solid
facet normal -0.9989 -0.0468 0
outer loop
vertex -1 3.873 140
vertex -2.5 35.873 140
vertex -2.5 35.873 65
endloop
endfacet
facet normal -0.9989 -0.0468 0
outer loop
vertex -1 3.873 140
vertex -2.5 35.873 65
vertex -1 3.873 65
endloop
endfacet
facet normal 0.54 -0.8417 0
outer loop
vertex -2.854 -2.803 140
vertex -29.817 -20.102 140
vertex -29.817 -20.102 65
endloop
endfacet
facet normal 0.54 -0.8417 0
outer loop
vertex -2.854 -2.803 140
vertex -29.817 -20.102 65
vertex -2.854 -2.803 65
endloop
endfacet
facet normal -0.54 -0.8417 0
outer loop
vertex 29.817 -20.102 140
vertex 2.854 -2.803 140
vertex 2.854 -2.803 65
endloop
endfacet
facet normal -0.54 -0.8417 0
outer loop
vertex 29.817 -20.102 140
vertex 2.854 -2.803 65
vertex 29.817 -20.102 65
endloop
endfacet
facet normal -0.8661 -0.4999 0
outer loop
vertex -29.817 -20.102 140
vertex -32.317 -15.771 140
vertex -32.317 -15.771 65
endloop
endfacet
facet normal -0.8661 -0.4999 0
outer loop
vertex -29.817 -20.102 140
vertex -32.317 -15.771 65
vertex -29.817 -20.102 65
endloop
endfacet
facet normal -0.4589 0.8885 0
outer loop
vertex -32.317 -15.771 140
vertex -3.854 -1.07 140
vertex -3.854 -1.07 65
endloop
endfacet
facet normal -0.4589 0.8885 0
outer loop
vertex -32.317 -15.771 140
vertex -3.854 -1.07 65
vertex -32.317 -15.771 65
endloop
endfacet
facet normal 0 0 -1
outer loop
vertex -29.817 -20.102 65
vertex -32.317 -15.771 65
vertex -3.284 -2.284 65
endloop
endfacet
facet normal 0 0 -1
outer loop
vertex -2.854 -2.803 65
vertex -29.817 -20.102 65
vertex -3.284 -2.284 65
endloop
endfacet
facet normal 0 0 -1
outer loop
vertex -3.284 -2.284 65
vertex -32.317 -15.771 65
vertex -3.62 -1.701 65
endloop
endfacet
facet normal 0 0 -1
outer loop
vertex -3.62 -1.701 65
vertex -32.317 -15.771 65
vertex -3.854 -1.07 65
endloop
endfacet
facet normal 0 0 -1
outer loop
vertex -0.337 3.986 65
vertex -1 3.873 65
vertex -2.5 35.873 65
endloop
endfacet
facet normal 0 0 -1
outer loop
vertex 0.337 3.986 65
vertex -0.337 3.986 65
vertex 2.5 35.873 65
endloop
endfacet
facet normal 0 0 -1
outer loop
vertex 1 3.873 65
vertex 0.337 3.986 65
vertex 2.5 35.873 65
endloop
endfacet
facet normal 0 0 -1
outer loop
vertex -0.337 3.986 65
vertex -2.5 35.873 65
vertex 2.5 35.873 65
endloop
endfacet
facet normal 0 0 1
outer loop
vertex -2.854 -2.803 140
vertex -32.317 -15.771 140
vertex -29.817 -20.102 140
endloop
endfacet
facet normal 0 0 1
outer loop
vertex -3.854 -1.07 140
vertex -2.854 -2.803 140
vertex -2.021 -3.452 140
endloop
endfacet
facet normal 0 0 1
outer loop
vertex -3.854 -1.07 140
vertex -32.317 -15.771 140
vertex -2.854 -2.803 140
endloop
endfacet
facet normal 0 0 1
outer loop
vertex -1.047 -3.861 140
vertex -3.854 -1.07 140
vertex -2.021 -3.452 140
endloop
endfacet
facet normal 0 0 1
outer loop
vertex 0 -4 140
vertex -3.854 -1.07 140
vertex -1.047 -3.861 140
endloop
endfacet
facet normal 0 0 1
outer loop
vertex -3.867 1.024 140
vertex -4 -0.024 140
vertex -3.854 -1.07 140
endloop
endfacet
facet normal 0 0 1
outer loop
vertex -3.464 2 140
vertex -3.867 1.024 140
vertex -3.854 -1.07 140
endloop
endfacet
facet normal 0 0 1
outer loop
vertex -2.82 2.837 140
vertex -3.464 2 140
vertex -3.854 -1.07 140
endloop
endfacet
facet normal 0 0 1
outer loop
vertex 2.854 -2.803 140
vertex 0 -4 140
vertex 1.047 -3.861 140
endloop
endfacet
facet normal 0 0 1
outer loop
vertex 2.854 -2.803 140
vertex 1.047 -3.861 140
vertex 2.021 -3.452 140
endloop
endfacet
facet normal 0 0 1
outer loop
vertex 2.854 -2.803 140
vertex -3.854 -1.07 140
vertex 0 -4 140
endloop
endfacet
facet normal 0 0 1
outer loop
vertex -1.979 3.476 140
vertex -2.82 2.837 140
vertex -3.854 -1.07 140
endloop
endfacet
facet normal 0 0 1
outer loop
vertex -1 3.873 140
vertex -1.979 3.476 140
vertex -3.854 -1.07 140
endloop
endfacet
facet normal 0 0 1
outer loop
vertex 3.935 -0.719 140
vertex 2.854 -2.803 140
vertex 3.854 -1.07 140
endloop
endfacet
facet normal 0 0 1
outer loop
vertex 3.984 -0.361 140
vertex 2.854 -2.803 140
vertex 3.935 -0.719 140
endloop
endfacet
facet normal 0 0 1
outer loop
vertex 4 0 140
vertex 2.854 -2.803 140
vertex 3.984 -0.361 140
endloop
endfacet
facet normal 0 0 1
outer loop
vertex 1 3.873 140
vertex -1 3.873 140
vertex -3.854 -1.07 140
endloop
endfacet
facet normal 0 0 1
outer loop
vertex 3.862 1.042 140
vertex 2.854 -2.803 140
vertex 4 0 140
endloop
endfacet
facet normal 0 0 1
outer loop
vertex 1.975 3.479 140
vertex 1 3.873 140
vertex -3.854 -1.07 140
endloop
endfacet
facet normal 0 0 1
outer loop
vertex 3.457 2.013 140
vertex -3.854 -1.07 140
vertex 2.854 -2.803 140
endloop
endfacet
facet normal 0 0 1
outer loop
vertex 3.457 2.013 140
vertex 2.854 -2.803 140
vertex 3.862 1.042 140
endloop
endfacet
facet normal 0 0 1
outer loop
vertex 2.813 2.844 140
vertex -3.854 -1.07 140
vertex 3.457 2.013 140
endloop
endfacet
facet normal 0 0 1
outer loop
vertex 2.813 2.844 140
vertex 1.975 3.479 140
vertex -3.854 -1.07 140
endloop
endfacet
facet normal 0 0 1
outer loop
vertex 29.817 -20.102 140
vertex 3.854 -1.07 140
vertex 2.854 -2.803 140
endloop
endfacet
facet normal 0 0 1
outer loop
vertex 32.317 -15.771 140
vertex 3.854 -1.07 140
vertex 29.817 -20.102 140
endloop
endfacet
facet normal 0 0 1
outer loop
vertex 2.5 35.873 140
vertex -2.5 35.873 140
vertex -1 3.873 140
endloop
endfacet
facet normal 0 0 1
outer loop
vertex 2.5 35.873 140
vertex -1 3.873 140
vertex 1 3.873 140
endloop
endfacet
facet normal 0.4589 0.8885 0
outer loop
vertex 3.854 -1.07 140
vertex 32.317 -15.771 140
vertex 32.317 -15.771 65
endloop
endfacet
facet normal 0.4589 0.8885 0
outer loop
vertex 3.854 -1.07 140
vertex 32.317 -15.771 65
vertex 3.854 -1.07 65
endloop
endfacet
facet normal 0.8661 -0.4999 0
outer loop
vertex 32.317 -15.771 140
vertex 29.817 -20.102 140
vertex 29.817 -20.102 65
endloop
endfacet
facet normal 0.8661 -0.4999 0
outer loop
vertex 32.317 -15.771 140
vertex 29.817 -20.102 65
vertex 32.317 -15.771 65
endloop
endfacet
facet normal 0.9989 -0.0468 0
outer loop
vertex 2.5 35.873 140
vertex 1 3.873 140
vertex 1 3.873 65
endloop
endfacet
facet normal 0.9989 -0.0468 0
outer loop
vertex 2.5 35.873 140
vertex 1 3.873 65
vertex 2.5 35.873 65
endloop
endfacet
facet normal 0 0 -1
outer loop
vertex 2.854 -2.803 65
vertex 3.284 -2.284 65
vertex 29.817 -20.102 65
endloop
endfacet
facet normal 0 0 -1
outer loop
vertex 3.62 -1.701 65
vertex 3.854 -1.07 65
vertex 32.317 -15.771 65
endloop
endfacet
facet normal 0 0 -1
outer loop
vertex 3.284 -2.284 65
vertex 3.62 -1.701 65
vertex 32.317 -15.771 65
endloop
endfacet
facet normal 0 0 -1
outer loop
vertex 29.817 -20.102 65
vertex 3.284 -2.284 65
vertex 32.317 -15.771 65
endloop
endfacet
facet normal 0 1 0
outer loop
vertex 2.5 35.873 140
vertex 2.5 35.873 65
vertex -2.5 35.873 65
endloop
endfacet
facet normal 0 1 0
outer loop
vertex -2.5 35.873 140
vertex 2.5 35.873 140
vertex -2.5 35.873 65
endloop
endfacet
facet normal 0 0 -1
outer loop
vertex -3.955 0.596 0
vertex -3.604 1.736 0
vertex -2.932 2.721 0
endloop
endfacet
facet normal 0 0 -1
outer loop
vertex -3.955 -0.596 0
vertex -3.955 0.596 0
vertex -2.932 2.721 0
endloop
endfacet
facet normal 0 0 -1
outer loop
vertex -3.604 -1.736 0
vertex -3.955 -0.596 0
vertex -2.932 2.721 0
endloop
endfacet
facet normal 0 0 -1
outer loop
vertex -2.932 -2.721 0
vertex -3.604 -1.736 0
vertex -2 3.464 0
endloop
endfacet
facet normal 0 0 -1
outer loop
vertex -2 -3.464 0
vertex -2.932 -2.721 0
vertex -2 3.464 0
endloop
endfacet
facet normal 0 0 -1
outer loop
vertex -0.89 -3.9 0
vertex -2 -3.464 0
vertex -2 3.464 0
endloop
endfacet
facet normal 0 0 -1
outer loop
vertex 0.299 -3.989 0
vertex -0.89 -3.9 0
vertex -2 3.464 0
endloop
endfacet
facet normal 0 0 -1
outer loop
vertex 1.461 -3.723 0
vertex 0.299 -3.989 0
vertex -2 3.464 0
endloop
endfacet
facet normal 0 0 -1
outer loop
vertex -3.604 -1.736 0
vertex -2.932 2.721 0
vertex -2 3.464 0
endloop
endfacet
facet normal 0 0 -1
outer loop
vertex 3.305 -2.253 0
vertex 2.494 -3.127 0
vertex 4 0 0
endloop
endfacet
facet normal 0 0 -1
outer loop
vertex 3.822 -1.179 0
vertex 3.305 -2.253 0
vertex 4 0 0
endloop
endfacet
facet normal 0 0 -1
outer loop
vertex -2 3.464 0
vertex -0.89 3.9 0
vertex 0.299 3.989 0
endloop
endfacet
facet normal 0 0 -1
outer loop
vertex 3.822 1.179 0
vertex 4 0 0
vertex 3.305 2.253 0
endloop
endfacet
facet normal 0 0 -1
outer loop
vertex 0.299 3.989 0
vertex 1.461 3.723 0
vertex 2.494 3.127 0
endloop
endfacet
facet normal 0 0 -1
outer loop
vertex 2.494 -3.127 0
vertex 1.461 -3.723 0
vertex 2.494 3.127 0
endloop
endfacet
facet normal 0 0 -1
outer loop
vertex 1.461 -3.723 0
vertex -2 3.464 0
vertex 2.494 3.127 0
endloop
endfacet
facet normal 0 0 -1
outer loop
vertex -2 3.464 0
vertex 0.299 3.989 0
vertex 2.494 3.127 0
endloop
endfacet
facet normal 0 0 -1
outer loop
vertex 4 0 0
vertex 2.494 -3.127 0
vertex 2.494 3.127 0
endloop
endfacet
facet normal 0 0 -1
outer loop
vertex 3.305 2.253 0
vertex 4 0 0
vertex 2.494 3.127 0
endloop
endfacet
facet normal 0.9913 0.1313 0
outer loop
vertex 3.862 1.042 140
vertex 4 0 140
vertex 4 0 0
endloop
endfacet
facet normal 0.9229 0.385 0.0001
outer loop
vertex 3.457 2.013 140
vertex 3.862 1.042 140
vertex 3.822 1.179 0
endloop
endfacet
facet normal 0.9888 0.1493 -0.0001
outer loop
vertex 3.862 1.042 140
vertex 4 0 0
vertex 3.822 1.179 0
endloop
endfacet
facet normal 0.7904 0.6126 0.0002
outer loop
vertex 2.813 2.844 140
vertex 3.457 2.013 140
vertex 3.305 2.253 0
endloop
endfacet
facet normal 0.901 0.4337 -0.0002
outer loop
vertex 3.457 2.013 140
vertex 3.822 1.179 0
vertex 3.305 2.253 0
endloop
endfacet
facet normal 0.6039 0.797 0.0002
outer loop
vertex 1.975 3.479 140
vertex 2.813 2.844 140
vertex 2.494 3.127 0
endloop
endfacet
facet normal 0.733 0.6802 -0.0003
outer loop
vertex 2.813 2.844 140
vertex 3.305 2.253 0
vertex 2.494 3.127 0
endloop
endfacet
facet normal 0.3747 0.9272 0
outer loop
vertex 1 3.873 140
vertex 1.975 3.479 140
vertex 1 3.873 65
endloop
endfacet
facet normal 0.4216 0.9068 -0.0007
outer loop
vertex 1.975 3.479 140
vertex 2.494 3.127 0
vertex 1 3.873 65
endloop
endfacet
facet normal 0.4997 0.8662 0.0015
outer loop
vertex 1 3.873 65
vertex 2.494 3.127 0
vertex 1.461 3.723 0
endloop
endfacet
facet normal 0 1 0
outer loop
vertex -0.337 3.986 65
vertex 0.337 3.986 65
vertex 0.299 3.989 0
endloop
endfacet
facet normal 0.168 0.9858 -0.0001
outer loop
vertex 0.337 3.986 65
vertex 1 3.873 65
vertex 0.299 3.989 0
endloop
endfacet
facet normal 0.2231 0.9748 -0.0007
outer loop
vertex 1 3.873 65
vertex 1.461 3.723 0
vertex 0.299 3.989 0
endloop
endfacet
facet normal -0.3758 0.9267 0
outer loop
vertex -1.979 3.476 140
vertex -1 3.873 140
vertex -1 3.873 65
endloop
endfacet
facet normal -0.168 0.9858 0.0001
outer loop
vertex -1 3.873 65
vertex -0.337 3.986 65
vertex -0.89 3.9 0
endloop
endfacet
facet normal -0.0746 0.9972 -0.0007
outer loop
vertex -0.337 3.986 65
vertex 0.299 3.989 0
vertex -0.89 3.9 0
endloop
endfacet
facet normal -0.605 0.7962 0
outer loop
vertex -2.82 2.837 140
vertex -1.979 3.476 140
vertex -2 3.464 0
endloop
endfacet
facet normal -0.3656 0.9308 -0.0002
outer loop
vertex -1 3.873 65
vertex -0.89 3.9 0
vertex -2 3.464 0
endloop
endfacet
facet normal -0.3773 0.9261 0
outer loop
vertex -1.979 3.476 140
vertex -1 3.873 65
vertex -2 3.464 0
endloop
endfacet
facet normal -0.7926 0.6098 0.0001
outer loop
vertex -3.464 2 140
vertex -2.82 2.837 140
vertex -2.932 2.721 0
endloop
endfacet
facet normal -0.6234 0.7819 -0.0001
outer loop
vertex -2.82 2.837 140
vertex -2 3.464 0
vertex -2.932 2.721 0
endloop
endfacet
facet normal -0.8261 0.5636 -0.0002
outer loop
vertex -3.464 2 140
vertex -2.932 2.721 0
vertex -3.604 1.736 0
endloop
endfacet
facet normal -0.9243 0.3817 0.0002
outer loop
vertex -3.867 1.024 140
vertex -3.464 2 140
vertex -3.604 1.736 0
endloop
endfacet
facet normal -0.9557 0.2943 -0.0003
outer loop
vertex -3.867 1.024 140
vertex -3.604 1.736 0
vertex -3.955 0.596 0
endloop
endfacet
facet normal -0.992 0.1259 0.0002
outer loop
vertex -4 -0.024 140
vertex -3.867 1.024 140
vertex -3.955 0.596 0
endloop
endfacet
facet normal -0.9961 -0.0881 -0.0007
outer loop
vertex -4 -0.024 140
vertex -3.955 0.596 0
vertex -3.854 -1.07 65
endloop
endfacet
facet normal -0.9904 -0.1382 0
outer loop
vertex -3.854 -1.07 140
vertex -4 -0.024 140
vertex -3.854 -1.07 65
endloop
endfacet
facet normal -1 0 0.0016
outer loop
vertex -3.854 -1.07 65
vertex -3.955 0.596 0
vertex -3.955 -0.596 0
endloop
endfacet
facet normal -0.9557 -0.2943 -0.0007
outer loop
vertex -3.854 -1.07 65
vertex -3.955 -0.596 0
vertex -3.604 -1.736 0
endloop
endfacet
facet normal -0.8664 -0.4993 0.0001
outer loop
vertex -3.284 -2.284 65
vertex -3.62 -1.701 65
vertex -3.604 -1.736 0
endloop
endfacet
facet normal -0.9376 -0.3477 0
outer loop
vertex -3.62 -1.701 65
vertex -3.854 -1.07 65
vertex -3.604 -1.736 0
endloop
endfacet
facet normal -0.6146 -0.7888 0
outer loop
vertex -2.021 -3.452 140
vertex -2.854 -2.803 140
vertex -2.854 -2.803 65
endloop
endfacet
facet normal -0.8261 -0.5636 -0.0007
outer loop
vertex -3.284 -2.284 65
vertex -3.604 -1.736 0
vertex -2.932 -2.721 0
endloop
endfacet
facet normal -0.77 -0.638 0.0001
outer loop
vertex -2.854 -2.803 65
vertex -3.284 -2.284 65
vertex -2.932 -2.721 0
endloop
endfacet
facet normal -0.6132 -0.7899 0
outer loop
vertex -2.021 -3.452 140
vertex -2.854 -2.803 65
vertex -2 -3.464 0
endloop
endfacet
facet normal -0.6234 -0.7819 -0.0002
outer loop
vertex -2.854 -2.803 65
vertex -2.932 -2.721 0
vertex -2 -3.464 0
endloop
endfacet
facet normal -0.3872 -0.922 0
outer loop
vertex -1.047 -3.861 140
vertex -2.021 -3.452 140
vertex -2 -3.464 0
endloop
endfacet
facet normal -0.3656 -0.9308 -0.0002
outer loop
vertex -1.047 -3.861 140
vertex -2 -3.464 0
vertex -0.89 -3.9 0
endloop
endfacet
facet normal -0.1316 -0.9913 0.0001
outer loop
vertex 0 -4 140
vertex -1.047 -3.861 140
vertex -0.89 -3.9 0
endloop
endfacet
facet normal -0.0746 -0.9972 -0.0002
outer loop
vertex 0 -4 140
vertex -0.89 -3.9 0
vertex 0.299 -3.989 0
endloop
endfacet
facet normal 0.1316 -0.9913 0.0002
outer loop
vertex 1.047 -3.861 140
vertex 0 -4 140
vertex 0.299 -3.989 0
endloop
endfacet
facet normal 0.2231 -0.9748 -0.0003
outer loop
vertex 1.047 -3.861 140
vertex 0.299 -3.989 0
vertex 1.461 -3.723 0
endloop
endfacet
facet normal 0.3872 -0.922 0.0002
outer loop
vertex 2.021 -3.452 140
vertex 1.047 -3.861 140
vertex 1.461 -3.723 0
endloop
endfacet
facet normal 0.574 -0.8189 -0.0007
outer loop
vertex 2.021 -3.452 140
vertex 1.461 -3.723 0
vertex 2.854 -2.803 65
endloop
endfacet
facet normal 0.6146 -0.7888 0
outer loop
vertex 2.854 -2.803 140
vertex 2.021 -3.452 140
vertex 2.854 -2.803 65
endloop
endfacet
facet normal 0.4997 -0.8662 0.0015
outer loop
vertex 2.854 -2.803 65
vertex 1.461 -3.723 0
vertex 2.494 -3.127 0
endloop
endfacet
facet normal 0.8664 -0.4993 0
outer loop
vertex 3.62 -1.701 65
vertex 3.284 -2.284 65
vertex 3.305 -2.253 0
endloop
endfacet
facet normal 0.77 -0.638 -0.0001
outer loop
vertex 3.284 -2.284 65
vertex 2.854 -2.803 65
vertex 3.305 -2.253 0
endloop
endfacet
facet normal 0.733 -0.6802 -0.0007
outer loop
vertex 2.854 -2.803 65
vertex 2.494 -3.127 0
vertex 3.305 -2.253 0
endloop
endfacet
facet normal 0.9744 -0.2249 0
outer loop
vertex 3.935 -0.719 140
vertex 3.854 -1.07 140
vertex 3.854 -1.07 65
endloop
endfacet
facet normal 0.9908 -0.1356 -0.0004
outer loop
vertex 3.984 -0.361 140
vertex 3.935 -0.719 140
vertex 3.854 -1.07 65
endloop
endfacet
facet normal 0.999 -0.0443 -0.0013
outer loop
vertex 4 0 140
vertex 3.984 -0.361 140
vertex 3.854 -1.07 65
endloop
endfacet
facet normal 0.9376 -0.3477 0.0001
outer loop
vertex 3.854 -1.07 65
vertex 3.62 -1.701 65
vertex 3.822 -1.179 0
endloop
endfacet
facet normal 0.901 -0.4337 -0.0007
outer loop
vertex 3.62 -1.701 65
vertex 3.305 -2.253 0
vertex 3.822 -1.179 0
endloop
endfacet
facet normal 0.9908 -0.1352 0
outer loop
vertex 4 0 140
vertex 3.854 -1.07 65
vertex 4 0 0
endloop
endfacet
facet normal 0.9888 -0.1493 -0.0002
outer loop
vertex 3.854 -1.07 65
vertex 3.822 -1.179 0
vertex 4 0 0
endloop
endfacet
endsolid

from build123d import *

# Parameters (mm, degrees)
SKETCH1_R           = 4
BOSS_EXTRUDE1_DEPTH = 140
BOSS_EXTRUDE2_DEPTH = 75


with BuildPart() as part:
    # Sketch1 → Boss-Extrude1 (new body)
    with BuildSketch(Plane.XY):
        Circle(SKETCH1_R)
    extrude(amount=BOSS_EXTRUDE1_DEPTH)

    # Sketch2 → Boss-Extrude2 (add)
    with BuildSketch(Plane.XY.offset(140)):
        Polygon((2.5, 35.872983346), (-2.5, 35.872983346), (-1, 3.872983346), (1, 3.872983346), align=None)
        Polygon((32.316914887, -15.771428164), (3.854101966, -1.070466269), (2.854101966, -2.802517077), (29.816914887, -20.101555183), align=None)
        Polygon((-29.816914887, -20.101555183), (-2.854101966, -2.802517077), (-3.854101966, -1.070466269), (-32.316914887, -15.771428164), align=None)
    extrude(amount=-BOSS_EXTRUDE2_DEPTH)


solid = part.part
